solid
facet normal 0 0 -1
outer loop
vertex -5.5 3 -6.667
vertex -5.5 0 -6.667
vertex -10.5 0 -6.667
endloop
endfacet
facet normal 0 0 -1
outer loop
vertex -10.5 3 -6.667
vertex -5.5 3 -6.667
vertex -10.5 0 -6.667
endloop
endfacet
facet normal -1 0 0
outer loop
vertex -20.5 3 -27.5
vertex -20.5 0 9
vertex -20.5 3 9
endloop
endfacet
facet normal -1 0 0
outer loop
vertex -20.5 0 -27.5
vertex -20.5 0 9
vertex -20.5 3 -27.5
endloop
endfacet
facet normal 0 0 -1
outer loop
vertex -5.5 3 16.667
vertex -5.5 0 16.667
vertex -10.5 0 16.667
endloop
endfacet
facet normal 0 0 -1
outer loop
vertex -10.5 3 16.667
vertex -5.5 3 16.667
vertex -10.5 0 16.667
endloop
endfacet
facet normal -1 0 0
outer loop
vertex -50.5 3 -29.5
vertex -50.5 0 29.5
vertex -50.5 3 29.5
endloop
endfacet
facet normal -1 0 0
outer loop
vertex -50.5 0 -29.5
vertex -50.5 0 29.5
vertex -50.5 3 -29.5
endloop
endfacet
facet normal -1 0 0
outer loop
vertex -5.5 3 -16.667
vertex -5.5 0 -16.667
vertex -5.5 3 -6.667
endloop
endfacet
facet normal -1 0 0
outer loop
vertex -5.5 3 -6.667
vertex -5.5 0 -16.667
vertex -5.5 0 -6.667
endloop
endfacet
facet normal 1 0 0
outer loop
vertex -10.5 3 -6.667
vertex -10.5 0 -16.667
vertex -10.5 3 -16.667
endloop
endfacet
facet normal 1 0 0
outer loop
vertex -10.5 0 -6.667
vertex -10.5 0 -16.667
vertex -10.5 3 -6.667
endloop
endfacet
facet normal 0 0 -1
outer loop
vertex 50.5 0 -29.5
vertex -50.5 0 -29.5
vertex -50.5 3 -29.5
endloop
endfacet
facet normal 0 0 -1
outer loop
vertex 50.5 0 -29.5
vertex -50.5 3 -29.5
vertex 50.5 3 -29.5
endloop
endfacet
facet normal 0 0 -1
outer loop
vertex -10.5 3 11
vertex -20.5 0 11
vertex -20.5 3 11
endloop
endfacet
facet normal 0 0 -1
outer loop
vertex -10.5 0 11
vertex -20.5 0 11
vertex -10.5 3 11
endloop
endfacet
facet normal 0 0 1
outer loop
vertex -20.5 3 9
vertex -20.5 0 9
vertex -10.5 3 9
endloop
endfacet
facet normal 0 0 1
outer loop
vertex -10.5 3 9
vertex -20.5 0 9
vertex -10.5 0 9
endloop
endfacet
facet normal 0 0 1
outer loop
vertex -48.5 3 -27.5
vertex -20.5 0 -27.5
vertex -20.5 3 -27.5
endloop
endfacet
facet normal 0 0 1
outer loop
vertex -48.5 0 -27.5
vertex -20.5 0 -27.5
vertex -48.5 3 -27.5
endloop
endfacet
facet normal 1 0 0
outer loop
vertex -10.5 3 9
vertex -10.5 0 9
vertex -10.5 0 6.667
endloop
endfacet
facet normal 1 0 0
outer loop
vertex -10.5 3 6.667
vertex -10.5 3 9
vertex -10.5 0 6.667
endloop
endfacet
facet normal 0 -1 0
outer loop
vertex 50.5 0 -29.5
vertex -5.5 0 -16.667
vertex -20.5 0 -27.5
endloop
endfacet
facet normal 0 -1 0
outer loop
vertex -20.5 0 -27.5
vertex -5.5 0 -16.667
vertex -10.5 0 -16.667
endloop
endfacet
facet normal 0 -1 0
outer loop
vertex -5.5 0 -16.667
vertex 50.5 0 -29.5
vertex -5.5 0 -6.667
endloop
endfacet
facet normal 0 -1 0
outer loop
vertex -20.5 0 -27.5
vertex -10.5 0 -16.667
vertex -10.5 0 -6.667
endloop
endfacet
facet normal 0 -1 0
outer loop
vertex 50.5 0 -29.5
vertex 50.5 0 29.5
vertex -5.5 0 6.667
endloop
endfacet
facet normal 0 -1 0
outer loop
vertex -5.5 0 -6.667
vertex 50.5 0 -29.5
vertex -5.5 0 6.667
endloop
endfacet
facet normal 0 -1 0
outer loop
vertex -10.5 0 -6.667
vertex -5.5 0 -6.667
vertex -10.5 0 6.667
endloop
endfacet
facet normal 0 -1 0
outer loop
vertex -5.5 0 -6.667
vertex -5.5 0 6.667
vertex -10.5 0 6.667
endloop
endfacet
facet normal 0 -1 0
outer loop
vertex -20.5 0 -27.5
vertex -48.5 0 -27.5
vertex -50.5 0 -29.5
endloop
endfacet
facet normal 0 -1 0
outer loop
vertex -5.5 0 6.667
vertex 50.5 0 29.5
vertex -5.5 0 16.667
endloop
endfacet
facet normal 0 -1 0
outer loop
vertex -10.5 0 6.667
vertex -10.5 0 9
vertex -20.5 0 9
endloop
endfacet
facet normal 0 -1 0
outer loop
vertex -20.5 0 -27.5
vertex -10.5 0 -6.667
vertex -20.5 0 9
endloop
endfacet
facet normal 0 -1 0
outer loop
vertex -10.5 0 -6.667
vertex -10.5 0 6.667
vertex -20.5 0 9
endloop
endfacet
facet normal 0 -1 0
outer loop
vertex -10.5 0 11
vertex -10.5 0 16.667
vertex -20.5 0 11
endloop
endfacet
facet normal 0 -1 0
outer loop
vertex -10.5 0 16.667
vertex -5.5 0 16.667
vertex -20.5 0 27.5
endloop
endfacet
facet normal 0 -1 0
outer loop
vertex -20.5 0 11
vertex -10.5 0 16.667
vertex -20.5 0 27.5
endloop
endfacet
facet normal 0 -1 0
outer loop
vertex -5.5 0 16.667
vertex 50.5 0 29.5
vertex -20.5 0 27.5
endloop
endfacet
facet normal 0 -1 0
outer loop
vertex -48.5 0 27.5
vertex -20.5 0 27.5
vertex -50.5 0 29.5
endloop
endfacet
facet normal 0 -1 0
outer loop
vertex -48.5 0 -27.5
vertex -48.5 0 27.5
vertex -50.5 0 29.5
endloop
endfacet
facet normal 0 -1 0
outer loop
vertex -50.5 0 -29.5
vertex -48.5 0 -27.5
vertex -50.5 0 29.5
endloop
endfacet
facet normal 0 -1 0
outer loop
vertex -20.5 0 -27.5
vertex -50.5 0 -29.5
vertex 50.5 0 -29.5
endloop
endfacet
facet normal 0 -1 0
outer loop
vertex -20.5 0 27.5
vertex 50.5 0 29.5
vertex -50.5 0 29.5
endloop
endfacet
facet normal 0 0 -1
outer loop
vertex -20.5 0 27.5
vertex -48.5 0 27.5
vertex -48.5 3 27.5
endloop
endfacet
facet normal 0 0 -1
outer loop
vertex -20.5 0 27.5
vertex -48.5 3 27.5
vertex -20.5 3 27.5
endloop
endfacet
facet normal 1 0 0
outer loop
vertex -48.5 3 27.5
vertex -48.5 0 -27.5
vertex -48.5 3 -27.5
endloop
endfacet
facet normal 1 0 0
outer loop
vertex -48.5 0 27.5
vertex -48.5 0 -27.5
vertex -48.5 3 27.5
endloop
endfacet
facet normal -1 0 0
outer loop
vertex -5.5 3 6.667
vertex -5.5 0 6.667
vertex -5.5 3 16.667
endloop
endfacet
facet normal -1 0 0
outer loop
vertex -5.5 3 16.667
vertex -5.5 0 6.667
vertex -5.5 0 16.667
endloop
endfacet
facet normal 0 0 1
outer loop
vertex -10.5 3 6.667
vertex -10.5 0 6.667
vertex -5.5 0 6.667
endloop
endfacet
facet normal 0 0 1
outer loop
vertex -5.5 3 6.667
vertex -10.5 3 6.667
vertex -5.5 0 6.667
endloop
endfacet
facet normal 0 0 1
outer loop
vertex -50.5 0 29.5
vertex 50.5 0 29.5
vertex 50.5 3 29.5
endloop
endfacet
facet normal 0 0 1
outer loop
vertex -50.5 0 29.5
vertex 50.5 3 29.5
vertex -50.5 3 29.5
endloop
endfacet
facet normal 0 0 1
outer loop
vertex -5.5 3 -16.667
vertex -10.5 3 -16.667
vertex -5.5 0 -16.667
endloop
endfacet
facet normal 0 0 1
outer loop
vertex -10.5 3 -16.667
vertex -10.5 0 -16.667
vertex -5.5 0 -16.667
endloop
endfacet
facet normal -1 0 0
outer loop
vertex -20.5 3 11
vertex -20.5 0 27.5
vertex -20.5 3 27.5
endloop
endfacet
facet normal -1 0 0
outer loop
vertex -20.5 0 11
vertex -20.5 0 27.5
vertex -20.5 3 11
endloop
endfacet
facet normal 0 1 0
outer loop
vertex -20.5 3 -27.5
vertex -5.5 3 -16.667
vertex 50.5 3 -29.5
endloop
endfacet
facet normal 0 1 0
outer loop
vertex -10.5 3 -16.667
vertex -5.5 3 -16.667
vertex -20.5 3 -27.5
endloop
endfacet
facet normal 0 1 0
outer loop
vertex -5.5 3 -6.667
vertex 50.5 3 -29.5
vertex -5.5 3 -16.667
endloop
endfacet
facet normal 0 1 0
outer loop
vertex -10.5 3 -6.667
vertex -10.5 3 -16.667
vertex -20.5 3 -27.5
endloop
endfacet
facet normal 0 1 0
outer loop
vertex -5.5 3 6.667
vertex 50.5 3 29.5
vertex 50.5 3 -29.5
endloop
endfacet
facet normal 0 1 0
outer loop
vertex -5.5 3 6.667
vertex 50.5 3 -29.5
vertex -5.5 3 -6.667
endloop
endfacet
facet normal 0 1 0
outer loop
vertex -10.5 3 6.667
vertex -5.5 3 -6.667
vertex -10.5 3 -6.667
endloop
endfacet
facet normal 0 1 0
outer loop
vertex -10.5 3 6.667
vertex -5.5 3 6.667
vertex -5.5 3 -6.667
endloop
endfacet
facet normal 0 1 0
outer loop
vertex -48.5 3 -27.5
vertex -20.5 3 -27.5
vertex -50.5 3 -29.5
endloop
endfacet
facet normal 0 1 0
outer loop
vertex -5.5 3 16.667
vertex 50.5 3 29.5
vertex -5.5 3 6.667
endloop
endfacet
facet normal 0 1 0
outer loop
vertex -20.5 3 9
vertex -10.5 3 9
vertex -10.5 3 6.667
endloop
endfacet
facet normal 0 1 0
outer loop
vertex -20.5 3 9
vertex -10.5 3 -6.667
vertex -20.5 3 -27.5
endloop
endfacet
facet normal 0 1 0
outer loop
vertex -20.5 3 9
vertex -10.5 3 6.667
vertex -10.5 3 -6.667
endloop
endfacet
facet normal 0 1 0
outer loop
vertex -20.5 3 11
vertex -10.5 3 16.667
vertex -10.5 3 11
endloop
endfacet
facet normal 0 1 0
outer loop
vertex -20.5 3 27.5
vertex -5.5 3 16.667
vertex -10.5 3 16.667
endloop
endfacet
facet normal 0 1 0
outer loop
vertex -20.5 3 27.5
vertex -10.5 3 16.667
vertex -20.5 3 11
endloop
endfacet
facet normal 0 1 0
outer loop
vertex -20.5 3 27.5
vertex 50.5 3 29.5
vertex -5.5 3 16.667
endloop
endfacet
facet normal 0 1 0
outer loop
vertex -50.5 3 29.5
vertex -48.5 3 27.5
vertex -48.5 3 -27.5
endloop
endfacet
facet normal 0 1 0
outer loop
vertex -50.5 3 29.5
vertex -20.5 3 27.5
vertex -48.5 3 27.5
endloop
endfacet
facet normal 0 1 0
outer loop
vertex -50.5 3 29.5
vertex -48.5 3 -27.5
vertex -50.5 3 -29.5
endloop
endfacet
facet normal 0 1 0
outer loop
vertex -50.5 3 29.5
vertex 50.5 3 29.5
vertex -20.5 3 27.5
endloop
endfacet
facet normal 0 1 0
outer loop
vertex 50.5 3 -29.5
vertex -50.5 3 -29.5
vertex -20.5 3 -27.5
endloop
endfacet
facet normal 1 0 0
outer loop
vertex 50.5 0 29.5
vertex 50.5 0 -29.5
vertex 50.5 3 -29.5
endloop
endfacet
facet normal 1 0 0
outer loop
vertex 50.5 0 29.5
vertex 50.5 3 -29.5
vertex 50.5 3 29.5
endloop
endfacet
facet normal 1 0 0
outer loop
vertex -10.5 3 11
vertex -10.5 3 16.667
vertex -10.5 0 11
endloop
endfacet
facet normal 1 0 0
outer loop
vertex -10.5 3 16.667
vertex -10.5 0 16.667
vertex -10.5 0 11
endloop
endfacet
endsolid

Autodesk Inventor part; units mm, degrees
ref_plane "YZ Plane" through (0, 0, 0) normal (1, 0, 0) x (0, 1, 0)
ref_plane "XZ Plane" through (0, 0, 0) normal (0, 1, 0) x (-1, 0, 0)
ref_plane "XY Plane" through (0, 0, 0) normal (0, 0, 1) x (1, 0, 0)
sketch "Sketch1" plane through (0, 0, 0) normal (0, 1, 0) x (-1, 0, 0)
  line L0 (-50.5, 29.5) -> (50.5, 29.5)
  line L1 (50.5, 29.5) -> (50.5, -29.5)
  line L2 (50.5, -29.5) -> (-50.5, -29.5)
  line L3 (-50.5, -29.5) -> (-50.5, 29.5)
  line L4 (-50.5, 29.5) -> (50.5, -29.5) construction
  line L5 (50.5, 29.5) -> (-50.5, -29.5) construction
  line L6 (5.5, 16.6667) -> (10.5, 16.6667)
  line L7 (10.5, 6.6667) -> (5.5, 6.6667)
  line L8 (5.5, 6.6667) -> (5.5, 16.6667)
  line L9 (5.5, 16.6667) -> (10.5, 6.6667) construction
  line L10 (10.5, 16.6667) -> (5.5, 6.6667) construction
  line L11 (5.5, -6.6667) -> (10.5, -6.6667)
  line L12 (10.5, -16.6667) -> (5.5, -16.6667)
  line L13 (5.5, -16.6667) -> (5.5, -6.6667)
  line L14 (5.5, -6.6667) -> (10.5, -16.6667) construction
  line L15 (10.5, -6.6667) -> (5.5, -16.6667) construction
  line L16 (10.5, 10) -> (20.5, 10)
  line L17 (20.5, 11) -> (20.5, 9)
  line L18 (20.5, 9) -> (10.5, 9)
  line L19 (20.5, 11) -> (10.5, 11)
  line L20 (48.5, 27.5) -> (20.5, 27.5)
  line L21 (20.5, 27.5) -> (20.5, -27.5)
  line L22 (20.5, -27.5) -> (48.5, -27.5)
  line L23 (48.5, -27.5) -> (48.5, 27.5)
  line L24 (10.5, 16.6667) -> (10.5, 13.3333)
  line L25 (10.5, 13.3333) -> (10.5, 10)
  line L26 (10.5, 10) -> (10.5, 6.6667)
  line L27 (10.5, -16.6667) -> (10.5, -13.3333)
  line L28 (10.5, -13.3333) -> (10.5, -10)
  line L29 (10.5, -10) -> (10.5, -6.6667)
  line L30 (8, -11.6667) -> (8, 11.6667)
  line L31 (-50.5, 0) -> (50.5, 0)
  point P0 (0, 0)
  point P1 (0, 29.5)
  point P2 (0, -29.5)
  point P3 (0, 0)
  point P4 (8, 0)
  dimension "d0" = 101
  dimension "d1" = 59
  dimension "d7" = 5
  dimension "d8" = 10
  dimension "d9" = 5
  dimension "d10" = 10
  dimension "d11" = 10
  dimension "d12" = 2
  dimension "d16" = 2
  dimension "d17" = 2
  dimension "d18" = 2
  dimension "d19" = 28
  dimension "d20" = 20
extrude "Extrusion2" add sketch "Sketch1" along normal blind 3 contours L0 L1 L31 L23 L20 L21 L19 L25 L24 L6 L8 L7 L30 L3 | L31 L21 L22 L23 L1 L2 L3 | L30 L7 L26 L18 L21 L31
properties part number "Lag 3"
